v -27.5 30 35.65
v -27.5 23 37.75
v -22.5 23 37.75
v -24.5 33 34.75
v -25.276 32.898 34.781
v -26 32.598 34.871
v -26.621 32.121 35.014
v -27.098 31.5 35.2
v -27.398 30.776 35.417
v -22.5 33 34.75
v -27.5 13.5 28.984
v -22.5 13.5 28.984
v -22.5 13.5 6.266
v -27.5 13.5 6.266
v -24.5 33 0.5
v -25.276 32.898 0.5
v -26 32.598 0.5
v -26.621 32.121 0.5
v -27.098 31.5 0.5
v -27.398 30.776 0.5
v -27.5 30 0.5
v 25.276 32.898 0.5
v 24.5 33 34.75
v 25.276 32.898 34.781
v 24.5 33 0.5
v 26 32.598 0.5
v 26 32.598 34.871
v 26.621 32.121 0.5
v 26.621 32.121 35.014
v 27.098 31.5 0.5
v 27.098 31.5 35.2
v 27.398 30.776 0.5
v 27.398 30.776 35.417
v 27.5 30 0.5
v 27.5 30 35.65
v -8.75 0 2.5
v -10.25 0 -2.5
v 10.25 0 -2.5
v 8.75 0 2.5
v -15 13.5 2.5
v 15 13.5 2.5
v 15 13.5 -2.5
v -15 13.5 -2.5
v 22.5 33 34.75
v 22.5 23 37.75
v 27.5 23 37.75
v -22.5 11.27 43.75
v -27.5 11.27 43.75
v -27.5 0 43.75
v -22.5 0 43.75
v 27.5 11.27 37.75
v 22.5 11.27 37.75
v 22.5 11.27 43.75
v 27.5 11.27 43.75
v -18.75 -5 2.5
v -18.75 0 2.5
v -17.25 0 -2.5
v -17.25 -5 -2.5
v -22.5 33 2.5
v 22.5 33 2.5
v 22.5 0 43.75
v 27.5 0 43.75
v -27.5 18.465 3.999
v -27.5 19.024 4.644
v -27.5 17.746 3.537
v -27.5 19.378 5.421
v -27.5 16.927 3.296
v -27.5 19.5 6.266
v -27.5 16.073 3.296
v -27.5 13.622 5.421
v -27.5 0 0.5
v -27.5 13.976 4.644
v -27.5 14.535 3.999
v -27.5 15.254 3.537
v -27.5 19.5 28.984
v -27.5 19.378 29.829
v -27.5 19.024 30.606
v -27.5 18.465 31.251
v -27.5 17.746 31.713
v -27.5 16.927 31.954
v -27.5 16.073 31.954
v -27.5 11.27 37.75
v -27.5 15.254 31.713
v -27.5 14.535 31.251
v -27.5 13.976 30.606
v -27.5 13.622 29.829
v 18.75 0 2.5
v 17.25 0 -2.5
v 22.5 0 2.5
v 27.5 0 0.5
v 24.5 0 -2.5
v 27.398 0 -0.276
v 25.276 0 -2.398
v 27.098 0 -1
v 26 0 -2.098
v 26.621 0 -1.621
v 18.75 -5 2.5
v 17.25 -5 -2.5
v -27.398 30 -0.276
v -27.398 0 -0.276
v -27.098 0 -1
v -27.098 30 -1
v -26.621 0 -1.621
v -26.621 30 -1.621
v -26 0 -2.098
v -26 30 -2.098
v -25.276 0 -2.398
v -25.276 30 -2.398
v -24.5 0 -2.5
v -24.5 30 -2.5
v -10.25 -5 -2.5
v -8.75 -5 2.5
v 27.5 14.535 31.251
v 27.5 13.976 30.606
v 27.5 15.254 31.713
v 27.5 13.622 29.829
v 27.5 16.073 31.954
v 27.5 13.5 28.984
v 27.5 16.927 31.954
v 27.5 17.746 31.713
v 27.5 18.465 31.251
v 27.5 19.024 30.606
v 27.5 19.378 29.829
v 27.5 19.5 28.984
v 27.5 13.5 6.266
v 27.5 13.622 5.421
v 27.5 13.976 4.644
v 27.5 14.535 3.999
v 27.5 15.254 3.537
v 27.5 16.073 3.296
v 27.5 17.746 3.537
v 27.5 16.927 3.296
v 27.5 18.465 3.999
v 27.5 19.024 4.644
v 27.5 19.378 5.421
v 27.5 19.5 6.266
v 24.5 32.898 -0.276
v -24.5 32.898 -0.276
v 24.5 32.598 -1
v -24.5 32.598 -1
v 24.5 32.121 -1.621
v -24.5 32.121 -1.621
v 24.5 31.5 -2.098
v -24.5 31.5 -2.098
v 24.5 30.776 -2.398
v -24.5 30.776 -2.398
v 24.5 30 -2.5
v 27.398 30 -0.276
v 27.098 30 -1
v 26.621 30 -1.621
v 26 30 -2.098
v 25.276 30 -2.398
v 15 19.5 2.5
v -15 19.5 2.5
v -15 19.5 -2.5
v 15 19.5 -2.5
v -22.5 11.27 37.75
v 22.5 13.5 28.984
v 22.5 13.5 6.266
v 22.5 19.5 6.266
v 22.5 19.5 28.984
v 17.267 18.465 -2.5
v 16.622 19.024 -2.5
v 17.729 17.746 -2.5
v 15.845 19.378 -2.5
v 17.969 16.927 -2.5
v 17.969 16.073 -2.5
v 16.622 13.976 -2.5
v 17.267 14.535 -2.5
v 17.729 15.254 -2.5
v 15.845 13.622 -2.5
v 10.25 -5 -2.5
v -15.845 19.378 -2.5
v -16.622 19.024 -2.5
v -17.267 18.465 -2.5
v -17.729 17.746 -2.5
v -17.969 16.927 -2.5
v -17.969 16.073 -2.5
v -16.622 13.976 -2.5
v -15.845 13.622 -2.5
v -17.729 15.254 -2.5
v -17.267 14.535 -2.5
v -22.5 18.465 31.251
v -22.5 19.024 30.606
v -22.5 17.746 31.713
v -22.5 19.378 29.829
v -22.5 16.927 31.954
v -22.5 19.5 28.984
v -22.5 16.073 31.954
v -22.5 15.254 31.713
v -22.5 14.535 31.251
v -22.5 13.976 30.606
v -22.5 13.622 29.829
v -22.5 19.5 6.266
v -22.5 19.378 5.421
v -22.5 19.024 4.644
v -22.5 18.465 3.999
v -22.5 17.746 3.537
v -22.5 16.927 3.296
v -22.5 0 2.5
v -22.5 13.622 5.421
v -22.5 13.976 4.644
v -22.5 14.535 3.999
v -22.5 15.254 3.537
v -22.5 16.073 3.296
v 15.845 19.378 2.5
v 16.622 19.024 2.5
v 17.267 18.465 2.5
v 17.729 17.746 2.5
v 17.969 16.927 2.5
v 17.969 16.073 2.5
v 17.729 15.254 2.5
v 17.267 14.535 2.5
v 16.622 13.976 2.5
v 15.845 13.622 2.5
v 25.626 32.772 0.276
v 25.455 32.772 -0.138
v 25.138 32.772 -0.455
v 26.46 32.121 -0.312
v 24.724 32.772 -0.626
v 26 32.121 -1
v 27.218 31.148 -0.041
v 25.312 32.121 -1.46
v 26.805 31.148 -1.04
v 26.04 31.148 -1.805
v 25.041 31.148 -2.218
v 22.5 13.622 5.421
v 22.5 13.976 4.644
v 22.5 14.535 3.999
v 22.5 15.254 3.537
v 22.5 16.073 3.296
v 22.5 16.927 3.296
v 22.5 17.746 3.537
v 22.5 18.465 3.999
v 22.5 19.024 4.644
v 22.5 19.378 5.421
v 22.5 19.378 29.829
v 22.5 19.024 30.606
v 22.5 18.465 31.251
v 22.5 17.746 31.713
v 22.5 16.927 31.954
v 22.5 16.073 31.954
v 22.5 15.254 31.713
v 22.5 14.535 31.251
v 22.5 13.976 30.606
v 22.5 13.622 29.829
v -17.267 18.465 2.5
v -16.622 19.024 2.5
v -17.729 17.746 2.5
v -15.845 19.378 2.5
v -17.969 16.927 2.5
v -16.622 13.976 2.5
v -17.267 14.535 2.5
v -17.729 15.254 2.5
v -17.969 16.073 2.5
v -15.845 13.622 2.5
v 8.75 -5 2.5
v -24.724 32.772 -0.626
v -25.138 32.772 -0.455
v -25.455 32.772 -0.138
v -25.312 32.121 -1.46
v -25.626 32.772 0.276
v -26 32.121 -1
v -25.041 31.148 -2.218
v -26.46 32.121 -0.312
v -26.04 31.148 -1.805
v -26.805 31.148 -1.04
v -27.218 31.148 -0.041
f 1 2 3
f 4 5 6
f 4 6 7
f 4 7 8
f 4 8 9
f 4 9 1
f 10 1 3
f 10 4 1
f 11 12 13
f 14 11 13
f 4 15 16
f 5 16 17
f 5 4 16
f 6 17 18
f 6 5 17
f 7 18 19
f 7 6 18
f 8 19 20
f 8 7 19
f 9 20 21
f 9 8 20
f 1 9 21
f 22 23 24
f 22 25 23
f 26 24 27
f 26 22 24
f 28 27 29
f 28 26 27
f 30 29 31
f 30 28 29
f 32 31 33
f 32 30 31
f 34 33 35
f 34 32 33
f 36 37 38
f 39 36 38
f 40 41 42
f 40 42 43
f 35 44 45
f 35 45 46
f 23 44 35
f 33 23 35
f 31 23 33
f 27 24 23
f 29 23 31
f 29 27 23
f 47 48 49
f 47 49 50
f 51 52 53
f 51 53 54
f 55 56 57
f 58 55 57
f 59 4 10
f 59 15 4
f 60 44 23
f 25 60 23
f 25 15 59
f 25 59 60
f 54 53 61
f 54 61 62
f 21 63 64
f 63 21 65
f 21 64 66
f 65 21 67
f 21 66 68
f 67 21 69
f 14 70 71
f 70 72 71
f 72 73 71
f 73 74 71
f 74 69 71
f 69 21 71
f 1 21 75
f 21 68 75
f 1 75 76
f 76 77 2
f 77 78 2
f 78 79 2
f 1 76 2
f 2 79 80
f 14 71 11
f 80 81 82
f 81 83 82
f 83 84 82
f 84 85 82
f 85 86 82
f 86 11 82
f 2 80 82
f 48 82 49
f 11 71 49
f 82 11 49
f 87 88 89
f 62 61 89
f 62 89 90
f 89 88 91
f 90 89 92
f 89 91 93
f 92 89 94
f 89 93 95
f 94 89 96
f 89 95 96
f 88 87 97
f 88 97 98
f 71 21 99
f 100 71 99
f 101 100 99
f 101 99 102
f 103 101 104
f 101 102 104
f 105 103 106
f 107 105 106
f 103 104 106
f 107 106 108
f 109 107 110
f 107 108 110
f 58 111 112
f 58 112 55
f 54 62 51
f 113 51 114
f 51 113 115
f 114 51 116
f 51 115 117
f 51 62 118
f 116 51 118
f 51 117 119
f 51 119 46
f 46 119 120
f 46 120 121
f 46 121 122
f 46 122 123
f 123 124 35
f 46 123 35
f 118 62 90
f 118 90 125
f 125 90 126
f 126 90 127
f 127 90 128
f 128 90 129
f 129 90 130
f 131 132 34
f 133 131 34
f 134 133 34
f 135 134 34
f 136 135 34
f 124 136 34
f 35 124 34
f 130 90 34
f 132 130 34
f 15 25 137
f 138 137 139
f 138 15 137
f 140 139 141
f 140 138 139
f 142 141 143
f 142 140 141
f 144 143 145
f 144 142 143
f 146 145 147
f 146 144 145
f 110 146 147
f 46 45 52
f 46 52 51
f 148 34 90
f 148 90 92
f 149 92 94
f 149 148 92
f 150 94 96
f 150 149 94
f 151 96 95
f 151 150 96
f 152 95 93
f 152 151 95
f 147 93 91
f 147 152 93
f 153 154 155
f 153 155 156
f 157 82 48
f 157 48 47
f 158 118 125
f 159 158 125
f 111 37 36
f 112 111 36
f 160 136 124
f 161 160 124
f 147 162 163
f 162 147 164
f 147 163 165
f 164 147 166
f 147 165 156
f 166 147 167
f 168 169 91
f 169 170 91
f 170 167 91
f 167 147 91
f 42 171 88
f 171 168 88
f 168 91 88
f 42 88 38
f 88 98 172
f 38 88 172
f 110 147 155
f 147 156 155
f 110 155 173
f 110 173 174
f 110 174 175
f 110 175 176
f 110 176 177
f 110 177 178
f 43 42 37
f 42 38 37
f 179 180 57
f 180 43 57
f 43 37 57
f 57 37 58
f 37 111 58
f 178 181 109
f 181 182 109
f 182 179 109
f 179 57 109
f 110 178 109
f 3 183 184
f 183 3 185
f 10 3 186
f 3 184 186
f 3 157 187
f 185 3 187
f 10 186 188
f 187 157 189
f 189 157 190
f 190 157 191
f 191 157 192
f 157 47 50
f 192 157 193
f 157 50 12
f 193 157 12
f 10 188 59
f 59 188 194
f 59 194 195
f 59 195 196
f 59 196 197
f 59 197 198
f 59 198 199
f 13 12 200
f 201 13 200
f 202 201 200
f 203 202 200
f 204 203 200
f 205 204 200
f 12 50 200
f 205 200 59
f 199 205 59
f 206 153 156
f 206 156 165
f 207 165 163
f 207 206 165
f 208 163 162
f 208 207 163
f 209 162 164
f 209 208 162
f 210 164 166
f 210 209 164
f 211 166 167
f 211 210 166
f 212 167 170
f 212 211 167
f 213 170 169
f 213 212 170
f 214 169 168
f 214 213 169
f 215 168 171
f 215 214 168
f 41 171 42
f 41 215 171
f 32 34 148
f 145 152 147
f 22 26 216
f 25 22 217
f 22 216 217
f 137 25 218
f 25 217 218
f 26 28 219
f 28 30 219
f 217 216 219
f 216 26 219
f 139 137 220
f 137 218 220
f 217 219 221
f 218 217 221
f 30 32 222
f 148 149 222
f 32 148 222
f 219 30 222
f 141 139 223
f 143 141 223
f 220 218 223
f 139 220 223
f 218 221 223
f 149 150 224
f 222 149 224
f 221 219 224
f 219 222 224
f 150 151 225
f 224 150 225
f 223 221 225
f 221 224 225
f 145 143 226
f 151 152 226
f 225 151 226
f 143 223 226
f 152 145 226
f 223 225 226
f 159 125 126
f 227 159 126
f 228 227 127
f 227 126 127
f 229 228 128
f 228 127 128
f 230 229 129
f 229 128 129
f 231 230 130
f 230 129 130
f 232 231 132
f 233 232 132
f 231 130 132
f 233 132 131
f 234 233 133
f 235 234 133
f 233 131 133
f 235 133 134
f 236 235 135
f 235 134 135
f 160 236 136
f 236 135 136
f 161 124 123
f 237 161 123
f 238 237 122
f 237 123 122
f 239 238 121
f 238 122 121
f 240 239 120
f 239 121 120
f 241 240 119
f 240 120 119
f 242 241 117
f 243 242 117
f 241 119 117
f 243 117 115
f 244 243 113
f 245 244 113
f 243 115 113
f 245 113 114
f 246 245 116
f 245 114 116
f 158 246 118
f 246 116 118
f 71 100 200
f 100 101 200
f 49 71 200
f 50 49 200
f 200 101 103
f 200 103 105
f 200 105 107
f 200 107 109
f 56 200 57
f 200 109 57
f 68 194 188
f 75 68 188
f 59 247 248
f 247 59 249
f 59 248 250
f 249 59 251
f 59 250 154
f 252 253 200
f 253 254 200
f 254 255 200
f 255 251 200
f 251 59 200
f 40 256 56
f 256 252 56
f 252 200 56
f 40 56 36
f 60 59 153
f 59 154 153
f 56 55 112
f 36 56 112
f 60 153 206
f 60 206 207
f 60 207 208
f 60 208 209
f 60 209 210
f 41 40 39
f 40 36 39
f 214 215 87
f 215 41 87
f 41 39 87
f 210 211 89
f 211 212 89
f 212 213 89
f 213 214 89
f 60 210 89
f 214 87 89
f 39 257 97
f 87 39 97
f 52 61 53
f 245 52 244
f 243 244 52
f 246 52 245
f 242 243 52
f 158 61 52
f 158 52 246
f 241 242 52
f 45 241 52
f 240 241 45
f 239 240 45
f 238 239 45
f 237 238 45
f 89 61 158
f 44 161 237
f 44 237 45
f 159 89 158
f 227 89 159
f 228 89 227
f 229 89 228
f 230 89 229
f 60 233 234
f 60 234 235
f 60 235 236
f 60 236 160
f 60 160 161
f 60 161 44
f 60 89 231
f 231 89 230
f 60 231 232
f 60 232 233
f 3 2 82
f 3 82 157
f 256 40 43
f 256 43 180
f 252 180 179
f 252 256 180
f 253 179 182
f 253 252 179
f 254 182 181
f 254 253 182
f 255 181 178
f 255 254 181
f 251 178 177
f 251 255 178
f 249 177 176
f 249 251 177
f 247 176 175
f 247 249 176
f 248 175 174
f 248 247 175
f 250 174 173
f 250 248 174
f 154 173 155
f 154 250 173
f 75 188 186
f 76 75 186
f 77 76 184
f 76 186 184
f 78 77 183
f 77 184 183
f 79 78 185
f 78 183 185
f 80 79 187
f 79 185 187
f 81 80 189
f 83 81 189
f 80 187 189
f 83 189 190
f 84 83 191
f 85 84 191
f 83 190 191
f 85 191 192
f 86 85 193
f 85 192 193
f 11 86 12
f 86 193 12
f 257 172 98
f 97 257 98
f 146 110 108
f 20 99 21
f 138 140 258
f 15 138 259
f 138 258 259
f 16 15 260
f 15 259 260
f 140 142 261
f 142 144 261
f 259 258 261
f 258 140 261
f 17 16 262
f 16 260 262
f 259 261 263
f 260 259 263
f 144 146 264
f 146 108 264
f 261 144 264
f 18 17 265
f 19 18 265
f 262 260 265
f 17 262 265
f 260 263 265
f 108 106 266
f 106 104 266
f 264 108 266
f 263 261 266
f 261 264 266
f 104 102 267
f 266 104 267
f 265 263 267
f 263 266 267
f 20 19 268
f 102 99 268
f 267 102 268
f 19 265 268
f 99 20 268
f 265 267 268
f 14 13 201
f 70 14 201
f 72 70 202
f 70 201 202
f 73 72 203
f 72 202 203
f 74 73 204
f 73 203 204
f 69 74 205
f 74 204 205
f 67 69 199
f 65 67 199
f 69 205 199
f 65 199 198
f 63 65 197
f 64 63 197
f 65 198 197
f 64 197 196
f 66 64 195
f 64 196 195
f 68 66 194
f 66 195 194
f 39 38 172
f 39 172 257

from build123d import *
from OCP.BRepFilletAPI import BRepFilletAPI_MakeChamfer

# Parameters (mm, degrees)
BOSS_EXTRUDE1_DEPTH     = 5
BOSS_EXTRUDE1_2_DEPTH   = 5
BOSS_EXTRUDE2_DEPTH     = 33
CUT_EXTRUDE1_DEPTH      = 75.424878233
CUT_EXTRUDE1_DEPTH_BACK = 75.424878233
SKETCH4_W               = 5
SKETCH4_H               = 11.27
BOSS_EXTRUDE3_DEPTH     = 6
CHAMFER1_SIZE           = 10
CHAMFER1_SIZE2          = 3
CUT_EXTRUDE2_DEPTH      = 60.555121526
FILLET1_R               = 3
FILLET2_R               = 3


with BuildPart() as part:
    # Sketch1 → Boss-Extrude1 (new body)
    with BuildSketch(Plane(origin=(0, 0, 0), x_dir=(1, 0, 0), z_dir=(0, 1, 0))):
        Polygon((-18.75, -2.5), (-17.25, 2.5), (-10.25, 2.5), (-8.75, -2.5), align=None)
    extrude(amount=-BOSS_EXTRUDE1_DEPTH)



with BuildPart() as body_2:
    # Sketch1 → Boss-Extrude1 2 (new body)
    with BuildSketch(Plane(origin=(0, 0, 0), x_dir=(1, 0, 0), z_dir=(0, 1, 0))):
        Polygon((17.25, 2.5), (10.25, 2.5), (8.75, -2.5), (18.75, -2.5), align=None)
    extrude(amount=-BOSS_EXTRUDE1_2_DEPTH)


with BuildPart() as part_1:
    add(part.part)

    add(body_2.part)  # Boss-Extrude2 merges body 2
    # Sketch2 → Boss-Extrude2 (add)
    with BuildSketch(Plane(origin=(0, 0, 0), x_dir=(1, 0, 0), z_dir=(0, 1, 0))):
        Polygon((27.5, 2.5), (-27.5, 2.5), (-27.5, -2.5), (-27.5, -37.75), (-22.5, -37.75), (-22.5, -2.5), (22.5, -2.5), (22.5, -37.75), (27.5, -37.75), (27.5, -2.5), align=None)
    extrude(amount=BOSS_EXTRUDE2_DEPTH)

    # Sketch3 → Cut-Extrude1 (cut, two sides: drawn at the far end of the back side and taken through both)
    with BuildSketch(Plane.ZY.offset(27.5).offset(-CUT_EXTRUDE1_DEPTH_BACK)):
        with BuildLine():
            Line((6.265950561, 19.5), (28.984049439, 19.5))
            ThreePointArc((28.984049439, 19.5), (31.984049439, 16.5), (28.984049439, 13.5))
            Line((28.984049439, 13.5), (6.265950561, 13.5))
            ThreePointArc((6.265950561, 13.5), (3.265950561, 16.5), (6.265950561, 19.5))
        make_face()
    extrude(amount=CUT_EXTRUDE1_DEPTH + CUT_EXTRUDE1_DEPTH_BACK, mode=Mode.SUBTRACT)

    # Sketch4 → Boss-Extrude3 (add)
    with BuildSketch(Plane.XY.offset(37.75)):
        with Locations((25, 5.635)):
            Rectangle(SKETCH4_W, SKETCH4_H)
        with Locations((-25, 5.635)):
            Rectangle(SKETCH4_W, SKETCH4_H)
    extrude(amount=BOSS_EXTRUDE3_DEPTH)

    # Chamfer1: one chamfer whose edges measure the first distance from different faces: ONE call of the kernel's chamfer builder (chamfer() names one face for all edges)
    chamfer1_edges_1 = [part_1.edges().sort_by_distance(p)[0] for p in [
        (-25, 33, 37.75),
    ]]
    chamfer1_side_1 = [part_1.faces().sort_by_distance(p)[0] for p in [
        (-25, 22.135, 37.75),
    ]]
    chamfer1_edges_2 = [part_1.edges().sort_by_distance(p)[0] for p in [
        (25, 33, 37.75),
    ]]
    chamfer1_side_2 = [part_1.faces().sort_by_distance(p)[0] for p in [
        (25, 22.135, 37.75),
    ]]
    chamfer1 = BRepFilletAPI_MakeChamfer(part_1.part.solid().wrapped)
    for e in chamfer1_edges_1:
        chamfer1.Add(CHAMFER1_SIZE, CHAMFER1_SIZE2, e.wrapped, chamfer1_side_1[0].wrapped)  # the first distance lies on this face
    for e in chamfer1_edges_2:
        chamfer1.Add(CHAMFER1_SIZE, CHAMFER1_SIZE2, e.wrapped, chamfer1_side_2[0].wrapped)  # the first distance lies on this face
    add(Compound.cast(chamfer1.Shape()), mode=Mode.REPLACE)

    # Sketch7 → Cut-Extrude2 (cut, through all)
    with BuildSketch(Plane.XY.offset(2.5)):
        with BuildLine():
            Line((-15, 19.5), (15, 19.5))
            ThreePointArc((15, 19.5), (18, 16.5), (15, 13.5))
            Line((15, 13.5), (-15, 13.5))
            ThreePointArc((-15, 13.5), (-18, 16.5), (-15, 19.5))
        make_face()
    extrude(amount=-CUT_EXTRUDE2_DEPTH, mode=Mode.SUBTRACT)

    # Fillet1
    fillet1_edges = [part_1.edges().sort_by_distance(p)[0] for p in [
        (27.5, 16.5, -2.5),
        (-27.5, 16.5, -2.5),
    ]]
    fillet(fillet1_edges, radius=FILLET1_R)

    # Fillet2
    fillet2_edges = [part_1.edges().sort_by_distance(p)[0] for p in [
        (27.5, 33, 17.625),
        (-27.5, 33, 17.625),
        (0, 33, -2.5),
        (26.621320344, 33, -1.621320344),
        (-26.621320344, 33, -1.621320344),
    ]]
    fillet(fillet2_edges, radius=FILLET2_R)


solid = part_1.part
